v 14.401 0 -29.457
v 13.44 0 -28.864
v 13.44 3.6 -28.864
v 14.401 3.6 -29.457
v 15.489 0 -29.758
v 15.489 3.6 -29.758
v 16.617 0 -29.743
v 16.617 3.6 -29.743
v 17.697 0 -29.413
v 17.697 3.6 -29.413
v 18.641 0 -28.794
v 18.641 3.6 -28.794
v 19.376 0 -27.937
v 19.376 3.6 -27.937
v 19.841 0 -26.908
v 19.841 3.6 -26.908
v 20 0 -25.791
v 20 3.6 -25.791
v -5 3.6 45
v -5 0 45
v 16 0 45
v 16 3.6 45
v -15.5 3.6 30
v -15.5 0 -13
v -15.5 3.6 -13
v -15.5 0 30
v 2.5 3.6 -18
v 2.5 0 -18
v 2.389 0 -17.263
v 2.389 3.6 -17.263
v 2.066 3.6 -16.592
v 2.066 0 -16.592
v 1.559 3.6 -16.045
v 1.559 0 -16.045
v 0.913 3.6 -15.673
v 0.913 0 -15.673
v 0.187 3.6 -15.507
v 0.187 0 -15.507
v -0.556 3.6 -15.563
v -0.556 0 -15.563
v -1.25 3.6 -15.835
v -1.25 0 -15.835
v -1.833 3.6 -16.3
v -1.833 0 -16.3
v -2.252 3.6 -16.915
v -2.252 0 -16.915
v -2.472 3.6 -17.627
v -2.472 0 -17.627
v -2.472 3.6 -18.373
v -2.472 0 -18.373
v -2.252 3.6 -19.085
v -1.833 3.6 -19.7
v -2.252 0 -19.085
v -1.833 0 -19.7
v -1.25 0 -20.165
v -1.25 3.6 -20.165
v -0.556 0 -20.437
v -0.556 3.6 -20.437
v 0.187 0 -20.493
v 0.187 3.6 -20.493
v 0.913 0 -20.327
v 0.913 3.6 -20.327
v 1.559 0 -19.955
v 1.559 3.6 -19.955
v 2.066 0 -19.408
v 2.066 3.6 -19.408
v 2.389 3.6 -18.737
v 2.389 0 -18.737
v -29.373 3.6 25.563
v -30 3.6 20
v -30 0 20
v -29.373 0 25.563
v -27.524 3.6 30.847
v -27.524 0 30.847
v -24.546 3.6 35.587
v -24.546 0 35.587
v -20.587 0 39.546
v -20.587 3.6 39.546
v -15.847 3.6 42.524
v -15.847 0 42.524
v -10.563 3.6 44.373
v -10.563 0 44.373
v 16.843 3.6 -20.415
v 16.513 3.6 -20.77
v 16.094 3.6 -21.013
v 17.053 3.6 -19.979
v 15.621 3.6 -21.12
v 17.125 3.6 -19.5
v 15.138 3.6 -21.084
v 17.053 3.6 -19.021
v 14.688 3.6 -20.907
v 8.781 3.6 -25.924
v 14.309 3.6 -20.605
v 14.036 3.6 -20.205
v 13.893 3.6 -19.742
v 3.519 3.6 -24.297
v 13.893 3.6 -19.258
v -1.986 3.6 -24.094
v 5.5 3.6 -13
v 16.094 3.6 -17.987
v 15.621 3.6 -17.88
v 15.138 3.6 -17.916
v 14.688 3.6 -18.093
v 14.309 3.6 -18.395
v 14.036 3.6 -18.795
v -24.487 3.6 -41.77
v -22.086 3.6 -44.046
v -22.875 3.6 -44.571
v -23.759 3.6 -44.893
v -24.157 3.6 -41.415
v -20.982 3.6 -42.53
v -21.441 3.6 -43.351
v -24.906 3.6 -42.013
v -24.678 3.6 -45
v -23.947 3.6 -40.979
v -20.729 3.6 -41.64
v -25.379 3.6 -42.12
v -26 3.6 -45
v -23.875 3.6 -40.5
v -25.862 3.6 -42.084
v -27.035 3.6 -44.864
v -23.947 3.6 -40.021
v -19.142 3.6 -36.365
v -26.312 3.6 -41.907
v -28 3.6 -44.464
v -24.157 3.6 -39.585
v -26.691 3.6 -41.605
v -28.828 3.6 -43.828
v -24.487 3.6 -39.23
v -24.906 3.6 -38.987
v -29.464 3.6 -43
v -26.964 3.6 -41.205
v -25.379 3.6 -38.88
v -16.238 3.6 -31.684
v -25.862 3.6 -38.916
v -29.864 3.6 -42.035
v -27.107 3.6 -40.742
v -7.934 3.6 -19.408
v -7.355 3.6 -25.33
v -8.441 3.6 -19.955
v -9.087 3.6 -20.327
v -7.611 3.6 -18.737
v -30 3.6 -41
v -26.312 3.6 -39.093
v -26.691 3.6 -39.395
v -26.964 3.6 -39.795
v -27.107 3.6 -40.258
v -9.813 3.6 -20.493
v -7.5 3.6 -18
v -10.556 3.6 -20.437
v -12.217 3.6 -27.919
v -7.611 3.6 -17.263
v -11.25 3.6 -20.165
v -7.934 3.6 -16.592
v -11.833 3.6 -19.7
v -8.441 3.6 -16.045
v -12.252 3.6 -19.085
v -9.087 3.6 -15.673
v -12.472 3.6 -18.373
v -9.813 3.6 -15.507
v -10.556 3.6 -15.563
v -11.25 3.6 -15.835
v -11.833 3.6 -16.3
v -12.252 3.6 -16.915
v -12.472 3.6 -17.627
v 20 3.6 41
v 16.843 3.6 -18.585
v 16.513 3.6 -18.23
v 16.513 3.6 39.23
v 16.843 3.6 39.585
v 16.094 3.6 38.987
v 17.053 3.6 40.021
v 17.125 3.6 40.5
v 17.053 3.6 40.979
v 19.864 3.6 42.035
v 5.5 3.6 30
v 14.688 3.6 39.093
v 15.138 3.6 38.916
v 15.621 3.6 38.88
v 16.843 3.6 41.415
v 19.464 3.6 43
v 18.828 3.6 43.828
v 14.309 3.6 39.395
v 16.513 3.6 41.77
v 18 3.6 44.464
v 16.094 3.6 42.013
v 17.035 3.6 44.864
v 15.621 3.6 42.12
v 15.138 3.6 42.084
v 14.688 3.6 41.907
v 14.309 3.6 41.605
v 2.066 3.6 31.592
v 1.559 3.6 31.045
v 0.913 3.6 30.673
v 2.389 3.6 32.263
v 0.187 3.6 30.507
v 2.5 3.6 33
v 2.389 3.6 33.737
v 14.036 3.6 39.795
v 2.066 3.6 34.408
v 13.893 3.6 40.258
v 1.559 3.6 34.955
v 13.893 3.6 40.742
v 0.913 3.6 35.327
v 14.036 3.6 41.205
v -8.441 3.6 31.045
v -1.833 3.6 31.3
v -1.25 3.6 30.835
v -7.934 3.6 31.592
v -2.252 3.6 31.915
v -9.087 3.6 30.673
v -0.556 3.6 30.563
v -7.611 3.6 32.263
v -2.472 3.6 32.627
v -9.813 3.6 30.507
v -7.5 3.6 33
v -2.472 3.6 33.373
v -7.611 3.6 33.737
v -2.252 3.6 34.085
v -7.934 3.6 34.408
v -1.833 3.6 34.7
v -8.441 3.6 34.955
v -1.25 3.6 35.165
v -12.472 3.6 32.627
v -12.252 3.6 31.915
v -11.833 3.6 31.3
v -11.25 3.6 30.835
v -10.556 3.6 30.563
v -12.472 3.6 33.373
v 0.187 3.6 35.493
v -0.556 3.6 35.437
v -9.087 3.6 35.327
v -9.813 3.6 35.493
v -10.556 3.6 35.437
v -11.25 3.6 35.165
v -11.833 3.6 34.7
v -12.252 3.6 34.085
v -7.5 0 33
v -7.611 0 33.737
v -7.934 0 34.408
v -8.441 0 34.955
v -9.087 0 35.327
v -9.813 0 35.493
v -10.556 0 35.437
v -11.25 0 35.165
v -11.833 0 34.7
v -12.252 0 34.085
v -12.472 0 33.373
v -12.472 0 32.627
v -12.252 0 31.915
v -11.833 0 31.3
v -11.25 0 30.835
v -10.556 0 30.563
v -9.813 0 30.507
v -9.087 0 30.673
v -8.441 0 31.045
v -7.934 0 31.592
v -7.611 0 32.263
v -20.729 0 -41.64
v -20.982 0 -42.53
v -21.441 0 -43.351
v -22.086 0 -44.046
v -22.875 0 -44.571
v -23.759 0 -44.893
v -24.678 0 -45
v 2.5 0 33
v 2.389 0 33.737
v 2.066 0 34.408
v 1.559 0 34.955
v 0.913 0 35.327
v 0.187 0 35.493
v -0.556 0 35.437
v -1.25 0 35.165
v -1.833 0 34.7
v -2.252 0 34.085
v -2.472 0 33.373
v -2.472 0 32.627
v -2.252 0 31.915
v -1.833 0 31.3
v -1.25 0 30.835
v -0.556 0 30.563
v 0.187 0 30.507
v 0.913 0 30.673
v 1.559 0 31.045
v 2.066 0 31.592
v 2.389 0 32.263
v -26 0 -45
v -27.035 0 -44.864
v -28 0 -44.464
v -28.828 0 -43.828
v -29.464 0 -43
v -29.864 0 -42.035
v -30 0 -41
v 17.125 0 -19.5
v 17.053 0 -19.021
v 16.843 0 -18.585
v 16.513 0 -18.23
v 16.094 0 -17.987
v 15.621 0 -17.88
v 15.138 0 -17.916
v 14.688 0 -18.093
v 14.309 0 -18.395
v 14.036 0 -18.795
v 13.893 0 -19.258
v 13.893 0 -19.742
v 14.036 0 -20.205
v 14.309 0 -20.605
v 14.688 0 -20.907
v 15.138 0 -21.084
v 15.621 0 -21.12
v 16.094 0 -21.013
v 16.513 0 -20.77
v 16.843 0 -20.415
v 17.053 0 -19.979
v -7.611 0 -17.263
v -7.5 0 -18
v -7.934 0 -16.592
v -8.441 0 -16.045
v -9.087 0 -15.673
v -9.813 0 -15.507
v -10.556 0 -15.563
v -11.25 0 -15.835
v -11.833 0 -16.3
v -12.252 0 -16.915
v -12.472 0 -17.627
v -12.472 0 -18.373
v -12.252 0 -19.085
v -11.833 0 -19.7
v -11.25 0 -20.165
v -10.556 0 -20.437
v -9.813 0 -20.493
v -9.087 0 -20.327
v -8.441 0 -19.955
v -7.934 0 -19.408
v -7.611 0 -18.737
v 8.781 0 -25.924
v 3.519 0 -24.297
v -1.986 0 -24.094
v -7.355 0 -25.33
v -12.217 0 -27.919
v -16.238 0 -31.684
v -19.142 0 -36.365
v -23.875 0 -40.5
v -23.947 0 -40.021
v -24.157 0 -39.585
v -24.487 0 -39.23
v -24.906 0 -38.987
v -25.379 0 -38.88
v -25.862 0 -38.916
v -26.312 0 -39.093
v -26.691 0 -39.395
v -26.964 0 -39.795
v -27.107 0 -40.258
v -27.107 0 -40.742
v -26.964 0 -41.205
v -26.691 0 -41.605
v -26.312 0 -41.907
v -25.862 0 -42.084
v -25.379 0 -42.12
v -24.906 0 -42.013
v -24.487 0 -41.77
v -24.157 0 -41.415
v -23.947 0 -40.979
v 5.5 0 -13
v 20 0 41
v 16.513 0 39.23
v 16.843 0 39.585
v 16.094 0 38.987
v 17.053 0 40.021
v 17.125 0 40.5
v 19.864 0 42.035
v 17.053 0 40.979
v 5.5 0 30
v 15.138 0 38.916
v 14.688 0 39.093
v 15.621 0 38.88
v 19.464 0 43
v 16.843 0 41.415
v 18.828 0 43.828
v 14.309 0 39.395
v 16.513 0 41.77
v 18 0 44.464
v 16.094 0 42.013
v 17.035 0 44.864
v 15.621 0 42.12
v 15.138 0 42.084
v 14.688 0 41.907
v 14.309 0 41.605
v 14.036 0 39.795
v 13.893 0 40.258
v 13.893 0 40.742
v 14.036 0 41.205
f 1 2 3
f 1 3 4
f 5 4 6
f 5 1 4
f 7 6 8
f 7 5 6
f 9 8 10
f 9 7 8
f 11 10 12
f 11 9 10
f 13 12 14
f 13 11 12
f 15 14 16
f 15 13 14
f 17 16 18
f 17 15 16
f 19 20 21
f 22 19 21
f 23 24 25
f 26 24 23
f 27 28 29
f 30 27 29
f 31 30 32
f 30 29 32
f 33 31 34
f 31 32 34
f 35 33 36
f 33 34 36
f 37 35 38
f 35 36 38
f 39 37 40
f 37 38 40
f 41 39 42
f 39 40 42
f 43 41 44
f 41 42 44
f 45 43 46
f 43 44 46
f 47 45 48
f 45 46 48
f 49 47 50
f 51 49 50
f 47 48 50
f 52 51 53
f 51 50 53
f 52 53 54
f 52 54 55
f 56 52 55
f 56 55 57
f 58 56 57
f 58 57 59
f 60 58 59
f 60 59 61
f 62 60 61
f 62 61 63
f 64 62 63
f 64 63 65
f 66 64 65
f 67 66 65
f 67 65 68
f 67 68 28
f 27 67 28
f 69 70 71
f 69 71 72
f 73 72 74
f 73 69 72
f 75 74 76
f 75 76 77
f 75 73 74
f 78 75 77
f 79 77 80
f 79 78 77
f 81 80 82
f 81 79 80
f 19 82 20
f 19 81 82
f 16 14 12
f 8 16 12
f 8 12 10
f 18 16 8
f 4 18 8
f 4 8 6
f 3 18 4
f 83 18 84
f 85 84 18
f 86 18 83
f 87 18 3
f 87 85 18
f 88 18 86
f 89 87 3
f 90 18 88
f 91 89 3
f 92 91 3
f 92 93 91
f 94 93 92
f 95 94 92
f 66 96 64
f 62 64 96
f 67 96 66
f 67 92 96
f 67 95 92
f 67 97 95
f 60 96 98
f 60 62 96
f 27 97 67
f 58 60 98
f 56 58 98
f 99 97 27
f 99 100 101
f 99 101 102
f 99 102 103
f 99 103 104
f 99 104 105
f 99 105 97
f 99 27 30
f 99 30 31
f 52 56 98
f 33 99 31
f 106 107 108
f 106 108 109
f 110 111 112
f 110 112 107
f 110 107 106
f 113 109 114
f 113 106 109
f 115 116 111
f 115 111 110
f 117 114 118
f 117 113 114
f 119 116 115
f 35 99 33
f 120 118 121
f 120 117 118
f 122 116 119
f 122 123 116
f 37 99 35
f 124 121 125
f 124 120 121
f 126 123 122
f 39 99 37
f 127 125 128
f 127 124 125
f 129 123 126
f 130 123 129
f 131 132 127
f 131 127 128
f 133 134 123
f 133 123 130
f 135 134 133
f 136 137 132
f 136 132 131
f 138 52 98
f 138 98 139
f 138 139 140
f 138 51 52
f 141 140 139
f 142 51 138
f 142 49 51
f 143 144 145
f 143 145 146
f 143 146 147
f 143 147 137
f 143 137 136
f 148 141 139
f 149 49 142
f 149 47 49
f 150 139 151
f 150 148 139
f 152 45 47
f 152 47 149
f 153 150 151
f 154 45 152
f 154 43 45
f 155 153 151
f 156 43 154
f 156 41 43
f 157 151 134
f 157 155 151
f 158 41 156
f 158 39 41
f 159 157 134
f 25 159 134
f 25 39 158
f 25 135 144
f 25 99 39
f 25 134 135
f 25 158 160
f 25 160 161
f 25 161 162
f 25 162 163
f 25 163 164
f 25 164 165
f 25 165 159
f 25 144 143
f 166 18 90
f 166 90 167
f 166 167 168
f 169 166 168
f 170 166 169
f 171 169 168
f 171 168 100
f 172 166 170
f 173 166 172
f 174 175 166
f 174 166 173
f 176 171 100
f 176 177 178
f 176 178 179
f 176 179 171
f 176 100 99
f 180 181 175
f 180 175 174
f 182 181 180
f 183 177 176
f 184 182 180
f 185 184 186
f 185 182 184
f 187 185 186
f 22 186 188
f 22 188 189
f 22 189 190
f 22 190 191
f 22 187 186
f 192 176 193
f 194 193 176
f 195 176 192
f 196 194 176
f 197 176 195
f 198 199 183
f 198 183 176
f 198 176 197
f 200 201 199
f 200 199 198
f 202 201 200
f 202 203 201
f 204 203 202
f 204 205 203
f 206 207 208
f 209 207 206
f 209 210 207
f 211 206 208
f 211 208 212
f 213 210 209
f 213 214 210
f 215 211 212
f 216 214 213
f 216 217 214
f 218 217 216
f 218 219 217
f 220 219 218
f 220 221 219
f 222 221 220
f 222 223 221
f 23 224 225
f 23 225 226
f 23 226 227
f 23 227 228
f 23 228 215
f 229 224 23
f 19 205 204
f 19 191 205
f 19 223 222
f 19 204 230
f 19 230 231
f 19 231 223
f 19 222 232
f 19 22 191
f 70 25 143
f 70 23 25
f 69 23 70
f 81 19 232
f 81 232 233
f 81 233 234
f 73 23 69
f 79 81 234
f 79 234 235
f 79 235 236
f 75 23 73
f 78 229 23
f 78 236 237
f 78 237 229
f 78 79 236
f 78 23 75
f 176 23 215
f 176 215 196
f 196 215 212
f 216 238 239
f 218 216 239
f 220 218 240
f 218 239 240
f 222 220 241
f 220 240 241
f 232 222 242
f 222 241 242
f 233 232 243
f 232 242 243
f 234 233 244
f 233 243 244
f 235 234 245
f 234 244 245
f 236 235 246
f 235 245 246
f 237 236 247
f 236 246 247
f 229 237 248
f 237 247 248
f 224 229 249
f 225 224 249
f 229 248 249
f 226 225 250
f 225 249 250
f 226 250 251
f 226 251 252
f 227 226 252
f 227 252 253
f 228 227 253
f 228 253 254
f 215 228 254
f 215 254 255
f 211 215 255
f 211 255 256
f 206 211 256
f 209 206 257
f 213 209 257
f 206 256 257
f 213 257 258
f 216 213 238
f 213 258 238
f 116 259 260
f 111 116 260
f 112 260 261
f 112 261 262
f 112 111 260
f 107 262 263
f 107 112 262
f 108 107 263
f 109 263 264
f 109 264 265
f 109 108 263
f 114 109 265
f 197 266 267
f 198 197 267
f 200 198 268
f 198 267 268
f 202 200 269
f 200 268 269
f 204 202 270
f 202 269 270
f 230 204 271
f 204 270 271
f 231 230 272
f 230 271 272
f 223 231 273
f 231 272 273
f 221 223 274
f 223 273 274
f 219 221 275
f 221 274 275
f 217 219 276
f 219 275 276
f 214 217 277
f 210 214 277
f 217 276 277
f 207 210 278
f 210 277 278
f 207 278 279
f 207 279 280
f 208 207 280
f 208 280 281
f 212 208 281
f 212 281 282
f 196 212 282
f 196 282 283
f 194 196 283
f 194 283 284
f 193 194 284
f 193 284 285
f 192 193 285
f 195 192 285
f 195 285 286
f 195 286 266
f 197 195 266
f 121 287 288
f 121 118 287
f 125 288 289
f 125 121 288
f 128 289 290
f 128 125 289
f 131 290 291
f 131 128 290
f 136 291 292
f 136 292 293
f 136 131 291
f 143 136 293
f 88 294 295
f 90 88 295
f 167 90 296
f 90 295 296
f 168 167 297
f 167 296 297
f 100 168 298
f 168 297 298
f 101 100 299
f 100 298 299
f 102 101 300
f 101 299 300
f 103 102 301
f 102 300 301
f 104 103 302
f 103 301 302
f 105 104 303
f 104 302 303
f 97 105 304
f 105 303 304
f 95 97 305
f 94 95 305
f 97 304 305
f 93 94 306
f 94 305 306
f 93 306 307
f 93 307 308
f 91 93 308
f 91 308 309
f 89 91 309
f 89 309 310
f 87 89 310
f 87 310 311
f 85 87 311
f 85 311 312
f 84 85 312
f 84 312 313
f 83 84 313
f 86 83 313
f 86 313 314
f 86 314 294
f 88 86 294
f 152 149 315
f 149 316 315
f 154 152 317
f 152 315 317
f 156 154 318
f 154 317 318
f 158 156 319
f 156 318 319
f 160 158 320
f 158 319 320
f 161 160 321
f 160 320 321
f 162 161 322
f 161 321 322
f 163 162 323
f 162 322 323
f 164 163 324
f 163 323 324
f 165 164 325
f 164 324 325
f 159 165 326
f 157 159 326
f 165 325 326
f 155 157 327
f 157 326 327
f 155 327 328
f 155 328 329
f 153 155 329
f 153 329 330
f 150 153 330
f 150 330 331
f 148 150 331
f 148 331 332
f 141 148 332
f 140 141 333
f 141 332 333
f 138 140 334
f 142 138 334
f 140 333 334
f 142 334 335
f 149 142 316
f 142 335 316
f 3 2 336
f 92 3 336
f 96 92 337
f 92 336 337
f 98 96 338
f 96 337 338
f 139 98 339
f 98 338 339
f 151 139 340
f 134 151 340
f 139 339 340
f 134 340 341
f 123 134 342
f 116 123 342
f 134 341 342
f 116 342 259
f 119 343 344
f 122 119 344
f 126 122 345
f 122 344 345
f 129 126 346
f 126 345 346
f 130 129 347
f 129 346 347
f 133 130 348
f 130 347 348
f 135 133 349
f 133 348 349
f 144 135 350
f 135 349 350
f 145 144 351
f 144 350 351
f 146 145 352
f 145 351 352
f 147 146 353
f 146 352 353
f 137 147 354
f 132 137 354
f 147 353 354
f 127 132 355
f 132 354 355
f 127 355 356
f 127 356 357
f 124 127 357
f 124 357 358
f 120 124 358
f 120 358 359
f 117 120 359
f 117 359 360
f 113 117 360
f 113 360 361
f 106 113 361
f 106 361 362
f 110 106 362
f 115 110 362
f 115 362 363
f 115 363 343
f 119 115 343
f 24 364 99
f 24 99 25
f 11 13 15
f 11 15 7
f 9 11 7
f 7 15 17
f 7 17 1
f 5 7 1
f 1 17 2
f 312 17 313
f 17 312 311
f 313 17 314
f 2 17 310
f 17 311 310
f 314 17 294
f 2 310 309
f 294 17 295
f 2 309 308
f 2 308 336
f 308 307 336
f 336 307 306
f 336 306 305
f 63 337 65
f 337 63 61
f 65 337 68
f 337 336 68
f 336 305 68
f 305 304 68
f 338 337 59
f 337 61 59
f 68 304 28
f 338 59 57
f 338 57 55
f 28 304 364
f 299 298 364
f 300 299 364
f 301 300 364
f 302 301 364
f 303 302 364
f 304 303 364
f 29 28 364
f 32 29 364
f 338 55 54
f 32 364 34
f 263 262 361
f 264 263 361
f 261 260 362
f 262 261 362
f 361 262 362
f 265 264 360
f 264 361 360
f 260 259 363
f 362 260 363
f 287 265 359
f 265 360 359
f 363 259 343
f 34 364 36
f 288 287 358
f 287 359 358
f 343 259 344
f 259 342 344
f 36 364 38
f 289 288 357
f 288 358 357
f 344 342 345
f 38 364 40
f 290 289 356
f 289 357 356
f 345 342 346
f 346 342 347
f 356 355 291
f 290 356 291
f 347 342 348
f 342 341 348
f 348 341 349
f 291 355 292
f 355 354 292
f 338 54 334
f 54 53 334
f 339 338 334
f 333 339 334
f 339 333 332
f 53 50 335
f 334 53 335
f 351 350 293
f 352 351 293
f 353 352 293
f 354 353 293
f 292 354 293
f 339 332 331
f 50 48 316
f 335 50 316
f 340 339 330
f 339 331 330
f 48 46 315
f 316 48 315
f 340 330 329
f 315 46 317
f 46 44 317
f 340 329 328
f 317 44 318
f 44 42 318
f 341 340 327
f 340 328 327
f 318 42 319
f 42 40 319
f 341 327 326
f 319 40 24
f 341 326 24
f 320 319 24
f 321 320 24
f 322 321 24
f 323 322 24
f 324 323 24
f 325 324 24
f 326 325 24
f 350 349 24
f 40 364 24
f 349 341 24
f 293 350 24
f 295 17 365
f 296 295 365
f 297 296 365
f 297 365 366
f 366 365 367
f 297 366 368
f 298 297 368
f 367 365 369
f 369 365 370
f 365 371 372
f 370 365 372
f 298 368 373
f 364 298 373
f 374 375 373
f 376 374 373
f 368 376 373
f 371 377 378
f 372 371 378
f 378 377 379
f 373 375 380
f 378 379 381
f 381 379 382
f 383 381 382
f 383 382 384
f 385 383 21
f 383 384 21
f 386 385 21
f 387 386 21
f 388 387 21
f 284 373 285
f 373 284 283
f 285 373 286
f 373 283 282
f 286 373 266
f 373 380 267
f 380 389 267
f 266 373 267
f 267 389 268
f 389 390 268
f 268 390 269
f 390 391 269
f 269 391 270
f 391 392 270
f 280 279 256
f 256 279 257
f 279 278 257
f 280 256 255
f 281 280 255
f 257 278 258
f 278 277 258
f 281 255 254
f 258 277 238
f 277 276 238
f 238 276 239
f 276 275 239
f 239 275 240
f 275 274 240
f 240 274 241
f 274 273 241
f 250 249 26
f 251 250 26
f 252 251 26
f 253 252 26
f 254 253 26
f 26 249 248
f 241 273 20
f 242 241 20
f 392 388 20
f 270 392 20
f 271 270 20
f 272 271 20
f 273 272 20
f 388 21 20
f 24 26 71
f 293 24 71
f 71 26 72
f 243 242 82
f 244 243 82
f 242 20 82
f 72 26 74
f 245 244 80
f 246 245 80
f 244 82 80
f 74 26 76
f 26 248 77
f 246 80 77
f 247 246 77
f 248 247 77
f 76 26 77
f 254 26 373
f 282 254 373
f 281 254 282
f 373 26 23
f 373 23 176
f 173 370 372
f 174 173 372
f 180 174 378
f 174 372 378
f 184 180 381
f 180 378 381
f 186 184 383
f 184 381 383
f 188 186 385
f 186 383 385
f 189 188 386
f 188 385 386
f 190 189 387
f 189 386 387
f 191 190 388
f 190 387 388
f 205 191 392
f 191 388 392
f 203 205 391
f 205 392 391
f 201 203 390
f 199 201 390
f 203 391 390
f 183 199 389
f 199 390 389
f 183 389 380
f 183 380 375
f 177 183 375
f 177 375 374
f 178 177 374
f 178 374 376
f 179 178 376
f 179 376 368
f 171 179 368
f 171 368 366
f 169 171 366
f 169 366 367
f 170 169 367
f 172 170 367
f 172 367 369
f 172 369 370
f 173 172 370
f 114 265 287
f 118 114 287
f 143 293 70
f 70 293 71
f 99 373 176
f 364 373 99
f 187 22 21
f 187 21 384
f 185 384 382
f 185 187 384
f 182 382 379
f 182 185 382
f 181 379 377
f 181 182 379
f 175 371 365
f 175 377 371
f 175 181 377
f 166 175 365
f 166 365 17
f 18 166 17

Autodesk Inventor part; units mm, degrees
ref_plane "YZ Plane" through (0, 0, 0) normal (1, 0, 0) x (0, 1, 0)
ref_plane "XZ Plane" through (0, 0, 0) normal (0, 1, 0) x (-1, 0, 0)
ref_plane "XY Plane" through (0, 0, 0) normal (0, 0, 1) x (1, 0, 0)
sketch "Sketch1" plane through (0, 0, 0) normal (0, 1, 0) x (-1, 0, 0)
  line L0 (20, 45) -> (-20, 45)
  line L1 (-20, 45) -> (-20, -45)
  line L2 (-20, -45) -> (20, -45)
  line L3 (20, -45) -> (20, 45)
  line L4 (20, 45) -> (-20, -45) construction
  line L5 (-20, 45) -> (20, -45) construction
  arc A0 (-20, -45) -> (20, -45) centre (0, -45) ccw
  line L6 (20, -45) -> (30, -45)
  line L7 (30, -45) -> (30, 45)
  line L8 (30, 45) -> (20, 45)
  line L9 (20, 45) -> (20, -45)
  point P0 (0, 0)
  dimension "d0" = 40
  dimension "d1" = 90
  dimension "d7" = 10
  dimension "d8" = 90
extrude "Extrusion1" add sketch "Sketch1" along normal blind 3.6
fillet "Fillet1" radius 4 3 edges at (-20, 1.8, -45) (-30, 1.8, -45) (20, 1.8, 45)
sketch "Sketch3" plane through (0, 0, 0) normal (0, -1, 0) x (1, 0, 0)
  circle A0 centre (0, -45) radius 21
  arc A1 (-19.7203, -48.3333) -> (20, -45) centre (0, -45) ccw projected
  point P0 (0, 0)
  dimension "d10" = 42
  dimension "d11" = 0
extrude "Extrusion3" cut sketch "Sketch3" against normal blind 10
fillet "Fillet2" radius 4 2 edges at (20, 1.8, -38.5969) (-20.9742, 1.8, -46.0397)
sketch "Sketch4" plane through (0, 0, 0) normal (0, -1, 0) x (1, 0, 0)
  circle A0 centre (-25.5, -40.5) radius 1.625
  line L0 (-24.6779, -45) -> (-26, -45) projected
  circle A1 centre (15.5, -19.5) radius 1.625
  circle A2 centre (15.5, 40.5) radius 1.625
  line L1 (20, 41) -> (20, -25.7906) projected
  arc A3 (13.44, -28.8641) -> (20, -25.7906) centre (16, -25.7906) ccw projected
  line L2 (-30, -41) -> (-30, 45) projected
  line L3 (-30, 45) -> (16, 45) projected
  point P0 (0, 0)
  point P1 (-30, 41)
  point P2 (-26, 45)
  dimension "d15" = 3.25
  dimension "d16" = 4.5
  dimension "d21" = 3.25
  dimension "d22" = 3.25
  dimension "d23" = 4.5
  dimension "d25" = 4.5
  dimension "d29" = 4.5
  dimension "d30" = 4.5
  dimension "d31" = 60
extrude "Extrusion4" cut sketch "Sketch4" against normal blind 7
sketch "Sketch5" plane through (0, 0, 0) normal (0, -1, 0) x (1, 0, 0)
  line L0 (-15.5, 30) -> (5.5, 30)
  line L1 (5.5, 30) -> (5.5, -13)
  line L2 (5.5, -13) -> (-15.5, -13)
  line L3 (-15.5, -13) -> (-15.5, 30)
  line L4 (-15.5, 30) -> (5.5, -13) construction
  line L5 (5.5, 30) -> (-15.5, -13) construction
  line L6 (-24.6779, -45) -> (-26, -45) projected
  line L7 (-30, -41) -> (-30, 45) projected
  point P0 (0, 0)
  point P1 (-5, 8.5)
  point P2 (-30, 41)
  dimension "d32" = 21
  dimension "d33" = 43
  dimension "d34" = 32
  dimension "d35" = 14.5
extrude "Extrusion5" cut sketch "Sketch5" against normal blind 10
sketch "Sketch6" plane through (0, 0, 0) normal (0, -1, 0) x (1, 0, 0)
  circle A0 centre (0, -18) radius 2.5
  circle A1 centre (0, 33) radius 2.5
  circle A2 centre (-10, -18) radius 2.5
  circle A3 centre (-10, 33) radius 2.5
  line L0 (5.5, 30) -> (5.5, -13) projected
  line L1 (5.5, -13) -> (-15.5, -13) projected
  point P0 (0, 0)
  dimension "d38" = 5
  dimension "d39" = 5
  dimension "d40" = 51
  dimension "d41" = 5
  dimension "d42" = 5
  dimension "d43" = 10
  dimension "d44" = 10
  dimension "d45" = 51
  dimension "d46" = 90
  dimension "d47" = 5.5
  dimension "d48" = 5
extrude "Extrusion6" cut sketch "Sketch6" against normal blind 10
fillet "Fillet3" radius 25 1 edges at (-30, 1.8, 45)
properties part number "p1"
